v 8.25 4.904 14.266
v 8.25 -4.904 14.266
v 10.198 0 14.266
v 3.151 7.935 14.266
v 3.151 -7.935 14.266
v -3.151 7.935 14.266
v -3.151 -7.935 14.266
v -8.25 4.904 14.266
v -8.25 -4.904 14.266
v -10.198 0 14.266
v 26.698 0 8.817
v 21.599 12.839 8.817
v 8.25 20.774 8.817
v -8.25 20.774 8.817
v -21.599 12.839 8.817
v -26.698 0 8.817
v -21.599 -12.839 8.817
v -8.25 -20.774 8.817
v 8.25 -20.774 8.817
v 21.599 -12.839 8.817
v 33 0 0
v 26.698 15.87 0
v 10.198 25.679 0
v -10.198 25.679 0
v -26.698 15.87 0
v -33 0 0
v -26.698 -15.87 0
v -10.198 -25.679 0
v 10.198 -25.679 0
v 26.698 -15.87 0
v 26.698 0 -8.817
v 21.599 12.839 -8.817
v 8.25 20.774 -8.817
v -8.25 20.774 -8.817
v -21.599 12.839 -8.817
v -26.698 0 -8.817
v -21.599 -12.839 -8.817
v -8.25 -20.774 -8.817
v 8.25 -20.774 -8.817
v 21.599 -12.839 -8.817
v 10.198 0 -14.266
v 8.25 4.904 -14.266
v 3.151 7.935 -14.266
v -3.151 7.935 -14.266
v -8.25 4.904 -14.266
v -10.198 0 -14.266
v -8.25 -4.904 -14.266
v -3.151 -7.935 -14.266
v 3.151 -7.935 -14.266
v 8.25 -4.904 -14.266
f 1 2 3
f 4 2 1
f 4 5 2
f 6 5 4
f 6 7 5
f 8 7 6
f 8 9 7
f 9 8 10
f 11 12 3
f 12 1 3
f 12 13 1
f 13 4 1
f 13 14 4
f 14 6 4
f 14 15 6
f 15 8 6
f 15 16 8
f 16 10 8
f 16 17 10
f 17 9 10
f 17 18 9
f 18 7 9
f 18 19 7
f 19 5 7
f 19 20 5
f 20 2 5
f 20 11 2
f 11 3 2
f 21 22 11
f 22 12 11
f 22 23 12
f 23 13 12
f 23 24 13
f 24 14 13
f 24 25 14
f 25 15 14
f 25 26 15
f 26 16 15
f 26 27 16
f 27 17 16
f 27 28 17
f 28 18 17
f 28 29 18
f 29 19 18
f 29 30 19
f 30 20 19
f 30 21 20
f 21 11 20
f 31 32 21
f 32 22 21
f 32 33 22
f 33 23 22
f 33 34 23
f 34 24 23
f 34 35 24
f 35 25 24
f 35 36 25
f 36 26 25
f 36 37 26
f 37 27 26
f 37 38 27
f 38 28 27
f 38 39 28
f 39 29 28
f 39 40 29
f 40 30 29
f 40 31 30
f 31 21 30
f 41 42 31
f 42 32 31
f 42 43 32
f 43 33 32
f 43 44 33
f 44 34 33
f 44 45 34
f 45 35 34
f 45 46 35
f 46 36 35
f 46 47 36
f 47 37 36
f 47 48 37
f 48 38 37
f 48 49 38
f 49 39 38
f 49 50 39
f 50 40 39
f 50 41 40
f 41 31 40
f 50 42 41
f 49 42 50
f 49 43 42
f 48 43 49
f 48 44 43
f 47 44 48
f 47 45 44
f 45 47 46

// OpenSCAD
// Generated by SolidPython 1.0.1 on 2020-07-29 00:46:49


scale(v = [11, 9, 5]) {
	sphere(r = 3);
}
/***********************************************
*********      SolidPython code:      **********
************************************************
 
# import packages: SolidPython
from solid import *
from solid.utils import *
from itertools import chain, combinations, permutations


class Resize:

    def __init__(self, scad_file):
        self.scad_file = scad_file
        #self.scad_file = import_scad(scad_file)
        # cone/cylinder param:
        self.r1 = 0
        self.r2 = 0
        self.h = 0
        # rectangular prism param:
        self.w = 0
        self.l = 0
        # ellipse param:
        self.r = 0

    # import OpenScad code (file name corresponds to shape)


    # classify shape + parameters
    def assign(self, param1, param2, param3):
        if self.scad_file == 'cone.scad':
            self.r1 = param1
            self.r2 = param2
            self.h = param3
        elif self.scad_file == 'cylinder.scad':
            self.r1 = param1
            self.r2 = param2
            self.h = param3
        elif self.scad_file == 'rectangularPrism.scad':
            self.h = param1
            self.l = param2
            self.w = param3
        else:
            self.r = param1
            self.h = param2

    # resize parameters
    def iterate(self):
        x = range(3, 20, 2)
        i = 1
        if self.scad_file == 'cone.scad':
            tempList = list(permutations(x, 2))
            for temp in tempList:
                param1 = temp[0]
                param2 = temp[1]
                filepath = 'produced_scad_files/' + 'cone' + str(param1) + '_' + str(param2) + '_' + '.scad'
                scad_render_to_file(cylinder(h=param1, r1=param2, r2=0), filepath)

        elif self.scad_file == 'cylinder.scad':
            tempList = list(permutations(x, 3))
            for temp in tempList:
                param1 = temp[0]
                param2 = temp[1]
                filepath = 'produced_scad_files/' + 'cylinder' + str(param1) + '_' + str(param2) + '_' + '.scad'
                scad_render_to_file(cylinder(h=param1, r1=param2, r2=param2), filepath)

        elif self.scad_file == 'rectangularPrism.scad':
            tempList = list(permutations(x, 3))
            for temp in tempList:
                param1 = temp[0]
                param2 = temp[1]
                param3 = temp[2]
                filepath = 'produced_scad_files/' + 'rectangularPrism' + str(param1) + '_' + str(param2) + '_' + str(
                    param3) + '.scad'
                scad_render_to_file(cube(size=(param1, param2, param3)), filepath)

        elif self.scad_file == 'ellipse.scad':
            tempList = list(permutations(x, 4))
            for temp in tempList:
                param1 = temp[0]
                param2 = temp[1]
                param3 = temp[2]
                param4 = temp[3]
                filepath = 'produced_scad_files/' + 'ellipse' + str(param1) + '_' + str(param2) + '_' + str(param3) + '_' + str(param4) + '.scad'
                scad_render_to_file(scale([param1, param2, param3])(sphere(r=param4)), filepath)

    def render_to_scadfile(self):
        scad_render_to_file(scad, 'example.scad') 
 
************************************************/
